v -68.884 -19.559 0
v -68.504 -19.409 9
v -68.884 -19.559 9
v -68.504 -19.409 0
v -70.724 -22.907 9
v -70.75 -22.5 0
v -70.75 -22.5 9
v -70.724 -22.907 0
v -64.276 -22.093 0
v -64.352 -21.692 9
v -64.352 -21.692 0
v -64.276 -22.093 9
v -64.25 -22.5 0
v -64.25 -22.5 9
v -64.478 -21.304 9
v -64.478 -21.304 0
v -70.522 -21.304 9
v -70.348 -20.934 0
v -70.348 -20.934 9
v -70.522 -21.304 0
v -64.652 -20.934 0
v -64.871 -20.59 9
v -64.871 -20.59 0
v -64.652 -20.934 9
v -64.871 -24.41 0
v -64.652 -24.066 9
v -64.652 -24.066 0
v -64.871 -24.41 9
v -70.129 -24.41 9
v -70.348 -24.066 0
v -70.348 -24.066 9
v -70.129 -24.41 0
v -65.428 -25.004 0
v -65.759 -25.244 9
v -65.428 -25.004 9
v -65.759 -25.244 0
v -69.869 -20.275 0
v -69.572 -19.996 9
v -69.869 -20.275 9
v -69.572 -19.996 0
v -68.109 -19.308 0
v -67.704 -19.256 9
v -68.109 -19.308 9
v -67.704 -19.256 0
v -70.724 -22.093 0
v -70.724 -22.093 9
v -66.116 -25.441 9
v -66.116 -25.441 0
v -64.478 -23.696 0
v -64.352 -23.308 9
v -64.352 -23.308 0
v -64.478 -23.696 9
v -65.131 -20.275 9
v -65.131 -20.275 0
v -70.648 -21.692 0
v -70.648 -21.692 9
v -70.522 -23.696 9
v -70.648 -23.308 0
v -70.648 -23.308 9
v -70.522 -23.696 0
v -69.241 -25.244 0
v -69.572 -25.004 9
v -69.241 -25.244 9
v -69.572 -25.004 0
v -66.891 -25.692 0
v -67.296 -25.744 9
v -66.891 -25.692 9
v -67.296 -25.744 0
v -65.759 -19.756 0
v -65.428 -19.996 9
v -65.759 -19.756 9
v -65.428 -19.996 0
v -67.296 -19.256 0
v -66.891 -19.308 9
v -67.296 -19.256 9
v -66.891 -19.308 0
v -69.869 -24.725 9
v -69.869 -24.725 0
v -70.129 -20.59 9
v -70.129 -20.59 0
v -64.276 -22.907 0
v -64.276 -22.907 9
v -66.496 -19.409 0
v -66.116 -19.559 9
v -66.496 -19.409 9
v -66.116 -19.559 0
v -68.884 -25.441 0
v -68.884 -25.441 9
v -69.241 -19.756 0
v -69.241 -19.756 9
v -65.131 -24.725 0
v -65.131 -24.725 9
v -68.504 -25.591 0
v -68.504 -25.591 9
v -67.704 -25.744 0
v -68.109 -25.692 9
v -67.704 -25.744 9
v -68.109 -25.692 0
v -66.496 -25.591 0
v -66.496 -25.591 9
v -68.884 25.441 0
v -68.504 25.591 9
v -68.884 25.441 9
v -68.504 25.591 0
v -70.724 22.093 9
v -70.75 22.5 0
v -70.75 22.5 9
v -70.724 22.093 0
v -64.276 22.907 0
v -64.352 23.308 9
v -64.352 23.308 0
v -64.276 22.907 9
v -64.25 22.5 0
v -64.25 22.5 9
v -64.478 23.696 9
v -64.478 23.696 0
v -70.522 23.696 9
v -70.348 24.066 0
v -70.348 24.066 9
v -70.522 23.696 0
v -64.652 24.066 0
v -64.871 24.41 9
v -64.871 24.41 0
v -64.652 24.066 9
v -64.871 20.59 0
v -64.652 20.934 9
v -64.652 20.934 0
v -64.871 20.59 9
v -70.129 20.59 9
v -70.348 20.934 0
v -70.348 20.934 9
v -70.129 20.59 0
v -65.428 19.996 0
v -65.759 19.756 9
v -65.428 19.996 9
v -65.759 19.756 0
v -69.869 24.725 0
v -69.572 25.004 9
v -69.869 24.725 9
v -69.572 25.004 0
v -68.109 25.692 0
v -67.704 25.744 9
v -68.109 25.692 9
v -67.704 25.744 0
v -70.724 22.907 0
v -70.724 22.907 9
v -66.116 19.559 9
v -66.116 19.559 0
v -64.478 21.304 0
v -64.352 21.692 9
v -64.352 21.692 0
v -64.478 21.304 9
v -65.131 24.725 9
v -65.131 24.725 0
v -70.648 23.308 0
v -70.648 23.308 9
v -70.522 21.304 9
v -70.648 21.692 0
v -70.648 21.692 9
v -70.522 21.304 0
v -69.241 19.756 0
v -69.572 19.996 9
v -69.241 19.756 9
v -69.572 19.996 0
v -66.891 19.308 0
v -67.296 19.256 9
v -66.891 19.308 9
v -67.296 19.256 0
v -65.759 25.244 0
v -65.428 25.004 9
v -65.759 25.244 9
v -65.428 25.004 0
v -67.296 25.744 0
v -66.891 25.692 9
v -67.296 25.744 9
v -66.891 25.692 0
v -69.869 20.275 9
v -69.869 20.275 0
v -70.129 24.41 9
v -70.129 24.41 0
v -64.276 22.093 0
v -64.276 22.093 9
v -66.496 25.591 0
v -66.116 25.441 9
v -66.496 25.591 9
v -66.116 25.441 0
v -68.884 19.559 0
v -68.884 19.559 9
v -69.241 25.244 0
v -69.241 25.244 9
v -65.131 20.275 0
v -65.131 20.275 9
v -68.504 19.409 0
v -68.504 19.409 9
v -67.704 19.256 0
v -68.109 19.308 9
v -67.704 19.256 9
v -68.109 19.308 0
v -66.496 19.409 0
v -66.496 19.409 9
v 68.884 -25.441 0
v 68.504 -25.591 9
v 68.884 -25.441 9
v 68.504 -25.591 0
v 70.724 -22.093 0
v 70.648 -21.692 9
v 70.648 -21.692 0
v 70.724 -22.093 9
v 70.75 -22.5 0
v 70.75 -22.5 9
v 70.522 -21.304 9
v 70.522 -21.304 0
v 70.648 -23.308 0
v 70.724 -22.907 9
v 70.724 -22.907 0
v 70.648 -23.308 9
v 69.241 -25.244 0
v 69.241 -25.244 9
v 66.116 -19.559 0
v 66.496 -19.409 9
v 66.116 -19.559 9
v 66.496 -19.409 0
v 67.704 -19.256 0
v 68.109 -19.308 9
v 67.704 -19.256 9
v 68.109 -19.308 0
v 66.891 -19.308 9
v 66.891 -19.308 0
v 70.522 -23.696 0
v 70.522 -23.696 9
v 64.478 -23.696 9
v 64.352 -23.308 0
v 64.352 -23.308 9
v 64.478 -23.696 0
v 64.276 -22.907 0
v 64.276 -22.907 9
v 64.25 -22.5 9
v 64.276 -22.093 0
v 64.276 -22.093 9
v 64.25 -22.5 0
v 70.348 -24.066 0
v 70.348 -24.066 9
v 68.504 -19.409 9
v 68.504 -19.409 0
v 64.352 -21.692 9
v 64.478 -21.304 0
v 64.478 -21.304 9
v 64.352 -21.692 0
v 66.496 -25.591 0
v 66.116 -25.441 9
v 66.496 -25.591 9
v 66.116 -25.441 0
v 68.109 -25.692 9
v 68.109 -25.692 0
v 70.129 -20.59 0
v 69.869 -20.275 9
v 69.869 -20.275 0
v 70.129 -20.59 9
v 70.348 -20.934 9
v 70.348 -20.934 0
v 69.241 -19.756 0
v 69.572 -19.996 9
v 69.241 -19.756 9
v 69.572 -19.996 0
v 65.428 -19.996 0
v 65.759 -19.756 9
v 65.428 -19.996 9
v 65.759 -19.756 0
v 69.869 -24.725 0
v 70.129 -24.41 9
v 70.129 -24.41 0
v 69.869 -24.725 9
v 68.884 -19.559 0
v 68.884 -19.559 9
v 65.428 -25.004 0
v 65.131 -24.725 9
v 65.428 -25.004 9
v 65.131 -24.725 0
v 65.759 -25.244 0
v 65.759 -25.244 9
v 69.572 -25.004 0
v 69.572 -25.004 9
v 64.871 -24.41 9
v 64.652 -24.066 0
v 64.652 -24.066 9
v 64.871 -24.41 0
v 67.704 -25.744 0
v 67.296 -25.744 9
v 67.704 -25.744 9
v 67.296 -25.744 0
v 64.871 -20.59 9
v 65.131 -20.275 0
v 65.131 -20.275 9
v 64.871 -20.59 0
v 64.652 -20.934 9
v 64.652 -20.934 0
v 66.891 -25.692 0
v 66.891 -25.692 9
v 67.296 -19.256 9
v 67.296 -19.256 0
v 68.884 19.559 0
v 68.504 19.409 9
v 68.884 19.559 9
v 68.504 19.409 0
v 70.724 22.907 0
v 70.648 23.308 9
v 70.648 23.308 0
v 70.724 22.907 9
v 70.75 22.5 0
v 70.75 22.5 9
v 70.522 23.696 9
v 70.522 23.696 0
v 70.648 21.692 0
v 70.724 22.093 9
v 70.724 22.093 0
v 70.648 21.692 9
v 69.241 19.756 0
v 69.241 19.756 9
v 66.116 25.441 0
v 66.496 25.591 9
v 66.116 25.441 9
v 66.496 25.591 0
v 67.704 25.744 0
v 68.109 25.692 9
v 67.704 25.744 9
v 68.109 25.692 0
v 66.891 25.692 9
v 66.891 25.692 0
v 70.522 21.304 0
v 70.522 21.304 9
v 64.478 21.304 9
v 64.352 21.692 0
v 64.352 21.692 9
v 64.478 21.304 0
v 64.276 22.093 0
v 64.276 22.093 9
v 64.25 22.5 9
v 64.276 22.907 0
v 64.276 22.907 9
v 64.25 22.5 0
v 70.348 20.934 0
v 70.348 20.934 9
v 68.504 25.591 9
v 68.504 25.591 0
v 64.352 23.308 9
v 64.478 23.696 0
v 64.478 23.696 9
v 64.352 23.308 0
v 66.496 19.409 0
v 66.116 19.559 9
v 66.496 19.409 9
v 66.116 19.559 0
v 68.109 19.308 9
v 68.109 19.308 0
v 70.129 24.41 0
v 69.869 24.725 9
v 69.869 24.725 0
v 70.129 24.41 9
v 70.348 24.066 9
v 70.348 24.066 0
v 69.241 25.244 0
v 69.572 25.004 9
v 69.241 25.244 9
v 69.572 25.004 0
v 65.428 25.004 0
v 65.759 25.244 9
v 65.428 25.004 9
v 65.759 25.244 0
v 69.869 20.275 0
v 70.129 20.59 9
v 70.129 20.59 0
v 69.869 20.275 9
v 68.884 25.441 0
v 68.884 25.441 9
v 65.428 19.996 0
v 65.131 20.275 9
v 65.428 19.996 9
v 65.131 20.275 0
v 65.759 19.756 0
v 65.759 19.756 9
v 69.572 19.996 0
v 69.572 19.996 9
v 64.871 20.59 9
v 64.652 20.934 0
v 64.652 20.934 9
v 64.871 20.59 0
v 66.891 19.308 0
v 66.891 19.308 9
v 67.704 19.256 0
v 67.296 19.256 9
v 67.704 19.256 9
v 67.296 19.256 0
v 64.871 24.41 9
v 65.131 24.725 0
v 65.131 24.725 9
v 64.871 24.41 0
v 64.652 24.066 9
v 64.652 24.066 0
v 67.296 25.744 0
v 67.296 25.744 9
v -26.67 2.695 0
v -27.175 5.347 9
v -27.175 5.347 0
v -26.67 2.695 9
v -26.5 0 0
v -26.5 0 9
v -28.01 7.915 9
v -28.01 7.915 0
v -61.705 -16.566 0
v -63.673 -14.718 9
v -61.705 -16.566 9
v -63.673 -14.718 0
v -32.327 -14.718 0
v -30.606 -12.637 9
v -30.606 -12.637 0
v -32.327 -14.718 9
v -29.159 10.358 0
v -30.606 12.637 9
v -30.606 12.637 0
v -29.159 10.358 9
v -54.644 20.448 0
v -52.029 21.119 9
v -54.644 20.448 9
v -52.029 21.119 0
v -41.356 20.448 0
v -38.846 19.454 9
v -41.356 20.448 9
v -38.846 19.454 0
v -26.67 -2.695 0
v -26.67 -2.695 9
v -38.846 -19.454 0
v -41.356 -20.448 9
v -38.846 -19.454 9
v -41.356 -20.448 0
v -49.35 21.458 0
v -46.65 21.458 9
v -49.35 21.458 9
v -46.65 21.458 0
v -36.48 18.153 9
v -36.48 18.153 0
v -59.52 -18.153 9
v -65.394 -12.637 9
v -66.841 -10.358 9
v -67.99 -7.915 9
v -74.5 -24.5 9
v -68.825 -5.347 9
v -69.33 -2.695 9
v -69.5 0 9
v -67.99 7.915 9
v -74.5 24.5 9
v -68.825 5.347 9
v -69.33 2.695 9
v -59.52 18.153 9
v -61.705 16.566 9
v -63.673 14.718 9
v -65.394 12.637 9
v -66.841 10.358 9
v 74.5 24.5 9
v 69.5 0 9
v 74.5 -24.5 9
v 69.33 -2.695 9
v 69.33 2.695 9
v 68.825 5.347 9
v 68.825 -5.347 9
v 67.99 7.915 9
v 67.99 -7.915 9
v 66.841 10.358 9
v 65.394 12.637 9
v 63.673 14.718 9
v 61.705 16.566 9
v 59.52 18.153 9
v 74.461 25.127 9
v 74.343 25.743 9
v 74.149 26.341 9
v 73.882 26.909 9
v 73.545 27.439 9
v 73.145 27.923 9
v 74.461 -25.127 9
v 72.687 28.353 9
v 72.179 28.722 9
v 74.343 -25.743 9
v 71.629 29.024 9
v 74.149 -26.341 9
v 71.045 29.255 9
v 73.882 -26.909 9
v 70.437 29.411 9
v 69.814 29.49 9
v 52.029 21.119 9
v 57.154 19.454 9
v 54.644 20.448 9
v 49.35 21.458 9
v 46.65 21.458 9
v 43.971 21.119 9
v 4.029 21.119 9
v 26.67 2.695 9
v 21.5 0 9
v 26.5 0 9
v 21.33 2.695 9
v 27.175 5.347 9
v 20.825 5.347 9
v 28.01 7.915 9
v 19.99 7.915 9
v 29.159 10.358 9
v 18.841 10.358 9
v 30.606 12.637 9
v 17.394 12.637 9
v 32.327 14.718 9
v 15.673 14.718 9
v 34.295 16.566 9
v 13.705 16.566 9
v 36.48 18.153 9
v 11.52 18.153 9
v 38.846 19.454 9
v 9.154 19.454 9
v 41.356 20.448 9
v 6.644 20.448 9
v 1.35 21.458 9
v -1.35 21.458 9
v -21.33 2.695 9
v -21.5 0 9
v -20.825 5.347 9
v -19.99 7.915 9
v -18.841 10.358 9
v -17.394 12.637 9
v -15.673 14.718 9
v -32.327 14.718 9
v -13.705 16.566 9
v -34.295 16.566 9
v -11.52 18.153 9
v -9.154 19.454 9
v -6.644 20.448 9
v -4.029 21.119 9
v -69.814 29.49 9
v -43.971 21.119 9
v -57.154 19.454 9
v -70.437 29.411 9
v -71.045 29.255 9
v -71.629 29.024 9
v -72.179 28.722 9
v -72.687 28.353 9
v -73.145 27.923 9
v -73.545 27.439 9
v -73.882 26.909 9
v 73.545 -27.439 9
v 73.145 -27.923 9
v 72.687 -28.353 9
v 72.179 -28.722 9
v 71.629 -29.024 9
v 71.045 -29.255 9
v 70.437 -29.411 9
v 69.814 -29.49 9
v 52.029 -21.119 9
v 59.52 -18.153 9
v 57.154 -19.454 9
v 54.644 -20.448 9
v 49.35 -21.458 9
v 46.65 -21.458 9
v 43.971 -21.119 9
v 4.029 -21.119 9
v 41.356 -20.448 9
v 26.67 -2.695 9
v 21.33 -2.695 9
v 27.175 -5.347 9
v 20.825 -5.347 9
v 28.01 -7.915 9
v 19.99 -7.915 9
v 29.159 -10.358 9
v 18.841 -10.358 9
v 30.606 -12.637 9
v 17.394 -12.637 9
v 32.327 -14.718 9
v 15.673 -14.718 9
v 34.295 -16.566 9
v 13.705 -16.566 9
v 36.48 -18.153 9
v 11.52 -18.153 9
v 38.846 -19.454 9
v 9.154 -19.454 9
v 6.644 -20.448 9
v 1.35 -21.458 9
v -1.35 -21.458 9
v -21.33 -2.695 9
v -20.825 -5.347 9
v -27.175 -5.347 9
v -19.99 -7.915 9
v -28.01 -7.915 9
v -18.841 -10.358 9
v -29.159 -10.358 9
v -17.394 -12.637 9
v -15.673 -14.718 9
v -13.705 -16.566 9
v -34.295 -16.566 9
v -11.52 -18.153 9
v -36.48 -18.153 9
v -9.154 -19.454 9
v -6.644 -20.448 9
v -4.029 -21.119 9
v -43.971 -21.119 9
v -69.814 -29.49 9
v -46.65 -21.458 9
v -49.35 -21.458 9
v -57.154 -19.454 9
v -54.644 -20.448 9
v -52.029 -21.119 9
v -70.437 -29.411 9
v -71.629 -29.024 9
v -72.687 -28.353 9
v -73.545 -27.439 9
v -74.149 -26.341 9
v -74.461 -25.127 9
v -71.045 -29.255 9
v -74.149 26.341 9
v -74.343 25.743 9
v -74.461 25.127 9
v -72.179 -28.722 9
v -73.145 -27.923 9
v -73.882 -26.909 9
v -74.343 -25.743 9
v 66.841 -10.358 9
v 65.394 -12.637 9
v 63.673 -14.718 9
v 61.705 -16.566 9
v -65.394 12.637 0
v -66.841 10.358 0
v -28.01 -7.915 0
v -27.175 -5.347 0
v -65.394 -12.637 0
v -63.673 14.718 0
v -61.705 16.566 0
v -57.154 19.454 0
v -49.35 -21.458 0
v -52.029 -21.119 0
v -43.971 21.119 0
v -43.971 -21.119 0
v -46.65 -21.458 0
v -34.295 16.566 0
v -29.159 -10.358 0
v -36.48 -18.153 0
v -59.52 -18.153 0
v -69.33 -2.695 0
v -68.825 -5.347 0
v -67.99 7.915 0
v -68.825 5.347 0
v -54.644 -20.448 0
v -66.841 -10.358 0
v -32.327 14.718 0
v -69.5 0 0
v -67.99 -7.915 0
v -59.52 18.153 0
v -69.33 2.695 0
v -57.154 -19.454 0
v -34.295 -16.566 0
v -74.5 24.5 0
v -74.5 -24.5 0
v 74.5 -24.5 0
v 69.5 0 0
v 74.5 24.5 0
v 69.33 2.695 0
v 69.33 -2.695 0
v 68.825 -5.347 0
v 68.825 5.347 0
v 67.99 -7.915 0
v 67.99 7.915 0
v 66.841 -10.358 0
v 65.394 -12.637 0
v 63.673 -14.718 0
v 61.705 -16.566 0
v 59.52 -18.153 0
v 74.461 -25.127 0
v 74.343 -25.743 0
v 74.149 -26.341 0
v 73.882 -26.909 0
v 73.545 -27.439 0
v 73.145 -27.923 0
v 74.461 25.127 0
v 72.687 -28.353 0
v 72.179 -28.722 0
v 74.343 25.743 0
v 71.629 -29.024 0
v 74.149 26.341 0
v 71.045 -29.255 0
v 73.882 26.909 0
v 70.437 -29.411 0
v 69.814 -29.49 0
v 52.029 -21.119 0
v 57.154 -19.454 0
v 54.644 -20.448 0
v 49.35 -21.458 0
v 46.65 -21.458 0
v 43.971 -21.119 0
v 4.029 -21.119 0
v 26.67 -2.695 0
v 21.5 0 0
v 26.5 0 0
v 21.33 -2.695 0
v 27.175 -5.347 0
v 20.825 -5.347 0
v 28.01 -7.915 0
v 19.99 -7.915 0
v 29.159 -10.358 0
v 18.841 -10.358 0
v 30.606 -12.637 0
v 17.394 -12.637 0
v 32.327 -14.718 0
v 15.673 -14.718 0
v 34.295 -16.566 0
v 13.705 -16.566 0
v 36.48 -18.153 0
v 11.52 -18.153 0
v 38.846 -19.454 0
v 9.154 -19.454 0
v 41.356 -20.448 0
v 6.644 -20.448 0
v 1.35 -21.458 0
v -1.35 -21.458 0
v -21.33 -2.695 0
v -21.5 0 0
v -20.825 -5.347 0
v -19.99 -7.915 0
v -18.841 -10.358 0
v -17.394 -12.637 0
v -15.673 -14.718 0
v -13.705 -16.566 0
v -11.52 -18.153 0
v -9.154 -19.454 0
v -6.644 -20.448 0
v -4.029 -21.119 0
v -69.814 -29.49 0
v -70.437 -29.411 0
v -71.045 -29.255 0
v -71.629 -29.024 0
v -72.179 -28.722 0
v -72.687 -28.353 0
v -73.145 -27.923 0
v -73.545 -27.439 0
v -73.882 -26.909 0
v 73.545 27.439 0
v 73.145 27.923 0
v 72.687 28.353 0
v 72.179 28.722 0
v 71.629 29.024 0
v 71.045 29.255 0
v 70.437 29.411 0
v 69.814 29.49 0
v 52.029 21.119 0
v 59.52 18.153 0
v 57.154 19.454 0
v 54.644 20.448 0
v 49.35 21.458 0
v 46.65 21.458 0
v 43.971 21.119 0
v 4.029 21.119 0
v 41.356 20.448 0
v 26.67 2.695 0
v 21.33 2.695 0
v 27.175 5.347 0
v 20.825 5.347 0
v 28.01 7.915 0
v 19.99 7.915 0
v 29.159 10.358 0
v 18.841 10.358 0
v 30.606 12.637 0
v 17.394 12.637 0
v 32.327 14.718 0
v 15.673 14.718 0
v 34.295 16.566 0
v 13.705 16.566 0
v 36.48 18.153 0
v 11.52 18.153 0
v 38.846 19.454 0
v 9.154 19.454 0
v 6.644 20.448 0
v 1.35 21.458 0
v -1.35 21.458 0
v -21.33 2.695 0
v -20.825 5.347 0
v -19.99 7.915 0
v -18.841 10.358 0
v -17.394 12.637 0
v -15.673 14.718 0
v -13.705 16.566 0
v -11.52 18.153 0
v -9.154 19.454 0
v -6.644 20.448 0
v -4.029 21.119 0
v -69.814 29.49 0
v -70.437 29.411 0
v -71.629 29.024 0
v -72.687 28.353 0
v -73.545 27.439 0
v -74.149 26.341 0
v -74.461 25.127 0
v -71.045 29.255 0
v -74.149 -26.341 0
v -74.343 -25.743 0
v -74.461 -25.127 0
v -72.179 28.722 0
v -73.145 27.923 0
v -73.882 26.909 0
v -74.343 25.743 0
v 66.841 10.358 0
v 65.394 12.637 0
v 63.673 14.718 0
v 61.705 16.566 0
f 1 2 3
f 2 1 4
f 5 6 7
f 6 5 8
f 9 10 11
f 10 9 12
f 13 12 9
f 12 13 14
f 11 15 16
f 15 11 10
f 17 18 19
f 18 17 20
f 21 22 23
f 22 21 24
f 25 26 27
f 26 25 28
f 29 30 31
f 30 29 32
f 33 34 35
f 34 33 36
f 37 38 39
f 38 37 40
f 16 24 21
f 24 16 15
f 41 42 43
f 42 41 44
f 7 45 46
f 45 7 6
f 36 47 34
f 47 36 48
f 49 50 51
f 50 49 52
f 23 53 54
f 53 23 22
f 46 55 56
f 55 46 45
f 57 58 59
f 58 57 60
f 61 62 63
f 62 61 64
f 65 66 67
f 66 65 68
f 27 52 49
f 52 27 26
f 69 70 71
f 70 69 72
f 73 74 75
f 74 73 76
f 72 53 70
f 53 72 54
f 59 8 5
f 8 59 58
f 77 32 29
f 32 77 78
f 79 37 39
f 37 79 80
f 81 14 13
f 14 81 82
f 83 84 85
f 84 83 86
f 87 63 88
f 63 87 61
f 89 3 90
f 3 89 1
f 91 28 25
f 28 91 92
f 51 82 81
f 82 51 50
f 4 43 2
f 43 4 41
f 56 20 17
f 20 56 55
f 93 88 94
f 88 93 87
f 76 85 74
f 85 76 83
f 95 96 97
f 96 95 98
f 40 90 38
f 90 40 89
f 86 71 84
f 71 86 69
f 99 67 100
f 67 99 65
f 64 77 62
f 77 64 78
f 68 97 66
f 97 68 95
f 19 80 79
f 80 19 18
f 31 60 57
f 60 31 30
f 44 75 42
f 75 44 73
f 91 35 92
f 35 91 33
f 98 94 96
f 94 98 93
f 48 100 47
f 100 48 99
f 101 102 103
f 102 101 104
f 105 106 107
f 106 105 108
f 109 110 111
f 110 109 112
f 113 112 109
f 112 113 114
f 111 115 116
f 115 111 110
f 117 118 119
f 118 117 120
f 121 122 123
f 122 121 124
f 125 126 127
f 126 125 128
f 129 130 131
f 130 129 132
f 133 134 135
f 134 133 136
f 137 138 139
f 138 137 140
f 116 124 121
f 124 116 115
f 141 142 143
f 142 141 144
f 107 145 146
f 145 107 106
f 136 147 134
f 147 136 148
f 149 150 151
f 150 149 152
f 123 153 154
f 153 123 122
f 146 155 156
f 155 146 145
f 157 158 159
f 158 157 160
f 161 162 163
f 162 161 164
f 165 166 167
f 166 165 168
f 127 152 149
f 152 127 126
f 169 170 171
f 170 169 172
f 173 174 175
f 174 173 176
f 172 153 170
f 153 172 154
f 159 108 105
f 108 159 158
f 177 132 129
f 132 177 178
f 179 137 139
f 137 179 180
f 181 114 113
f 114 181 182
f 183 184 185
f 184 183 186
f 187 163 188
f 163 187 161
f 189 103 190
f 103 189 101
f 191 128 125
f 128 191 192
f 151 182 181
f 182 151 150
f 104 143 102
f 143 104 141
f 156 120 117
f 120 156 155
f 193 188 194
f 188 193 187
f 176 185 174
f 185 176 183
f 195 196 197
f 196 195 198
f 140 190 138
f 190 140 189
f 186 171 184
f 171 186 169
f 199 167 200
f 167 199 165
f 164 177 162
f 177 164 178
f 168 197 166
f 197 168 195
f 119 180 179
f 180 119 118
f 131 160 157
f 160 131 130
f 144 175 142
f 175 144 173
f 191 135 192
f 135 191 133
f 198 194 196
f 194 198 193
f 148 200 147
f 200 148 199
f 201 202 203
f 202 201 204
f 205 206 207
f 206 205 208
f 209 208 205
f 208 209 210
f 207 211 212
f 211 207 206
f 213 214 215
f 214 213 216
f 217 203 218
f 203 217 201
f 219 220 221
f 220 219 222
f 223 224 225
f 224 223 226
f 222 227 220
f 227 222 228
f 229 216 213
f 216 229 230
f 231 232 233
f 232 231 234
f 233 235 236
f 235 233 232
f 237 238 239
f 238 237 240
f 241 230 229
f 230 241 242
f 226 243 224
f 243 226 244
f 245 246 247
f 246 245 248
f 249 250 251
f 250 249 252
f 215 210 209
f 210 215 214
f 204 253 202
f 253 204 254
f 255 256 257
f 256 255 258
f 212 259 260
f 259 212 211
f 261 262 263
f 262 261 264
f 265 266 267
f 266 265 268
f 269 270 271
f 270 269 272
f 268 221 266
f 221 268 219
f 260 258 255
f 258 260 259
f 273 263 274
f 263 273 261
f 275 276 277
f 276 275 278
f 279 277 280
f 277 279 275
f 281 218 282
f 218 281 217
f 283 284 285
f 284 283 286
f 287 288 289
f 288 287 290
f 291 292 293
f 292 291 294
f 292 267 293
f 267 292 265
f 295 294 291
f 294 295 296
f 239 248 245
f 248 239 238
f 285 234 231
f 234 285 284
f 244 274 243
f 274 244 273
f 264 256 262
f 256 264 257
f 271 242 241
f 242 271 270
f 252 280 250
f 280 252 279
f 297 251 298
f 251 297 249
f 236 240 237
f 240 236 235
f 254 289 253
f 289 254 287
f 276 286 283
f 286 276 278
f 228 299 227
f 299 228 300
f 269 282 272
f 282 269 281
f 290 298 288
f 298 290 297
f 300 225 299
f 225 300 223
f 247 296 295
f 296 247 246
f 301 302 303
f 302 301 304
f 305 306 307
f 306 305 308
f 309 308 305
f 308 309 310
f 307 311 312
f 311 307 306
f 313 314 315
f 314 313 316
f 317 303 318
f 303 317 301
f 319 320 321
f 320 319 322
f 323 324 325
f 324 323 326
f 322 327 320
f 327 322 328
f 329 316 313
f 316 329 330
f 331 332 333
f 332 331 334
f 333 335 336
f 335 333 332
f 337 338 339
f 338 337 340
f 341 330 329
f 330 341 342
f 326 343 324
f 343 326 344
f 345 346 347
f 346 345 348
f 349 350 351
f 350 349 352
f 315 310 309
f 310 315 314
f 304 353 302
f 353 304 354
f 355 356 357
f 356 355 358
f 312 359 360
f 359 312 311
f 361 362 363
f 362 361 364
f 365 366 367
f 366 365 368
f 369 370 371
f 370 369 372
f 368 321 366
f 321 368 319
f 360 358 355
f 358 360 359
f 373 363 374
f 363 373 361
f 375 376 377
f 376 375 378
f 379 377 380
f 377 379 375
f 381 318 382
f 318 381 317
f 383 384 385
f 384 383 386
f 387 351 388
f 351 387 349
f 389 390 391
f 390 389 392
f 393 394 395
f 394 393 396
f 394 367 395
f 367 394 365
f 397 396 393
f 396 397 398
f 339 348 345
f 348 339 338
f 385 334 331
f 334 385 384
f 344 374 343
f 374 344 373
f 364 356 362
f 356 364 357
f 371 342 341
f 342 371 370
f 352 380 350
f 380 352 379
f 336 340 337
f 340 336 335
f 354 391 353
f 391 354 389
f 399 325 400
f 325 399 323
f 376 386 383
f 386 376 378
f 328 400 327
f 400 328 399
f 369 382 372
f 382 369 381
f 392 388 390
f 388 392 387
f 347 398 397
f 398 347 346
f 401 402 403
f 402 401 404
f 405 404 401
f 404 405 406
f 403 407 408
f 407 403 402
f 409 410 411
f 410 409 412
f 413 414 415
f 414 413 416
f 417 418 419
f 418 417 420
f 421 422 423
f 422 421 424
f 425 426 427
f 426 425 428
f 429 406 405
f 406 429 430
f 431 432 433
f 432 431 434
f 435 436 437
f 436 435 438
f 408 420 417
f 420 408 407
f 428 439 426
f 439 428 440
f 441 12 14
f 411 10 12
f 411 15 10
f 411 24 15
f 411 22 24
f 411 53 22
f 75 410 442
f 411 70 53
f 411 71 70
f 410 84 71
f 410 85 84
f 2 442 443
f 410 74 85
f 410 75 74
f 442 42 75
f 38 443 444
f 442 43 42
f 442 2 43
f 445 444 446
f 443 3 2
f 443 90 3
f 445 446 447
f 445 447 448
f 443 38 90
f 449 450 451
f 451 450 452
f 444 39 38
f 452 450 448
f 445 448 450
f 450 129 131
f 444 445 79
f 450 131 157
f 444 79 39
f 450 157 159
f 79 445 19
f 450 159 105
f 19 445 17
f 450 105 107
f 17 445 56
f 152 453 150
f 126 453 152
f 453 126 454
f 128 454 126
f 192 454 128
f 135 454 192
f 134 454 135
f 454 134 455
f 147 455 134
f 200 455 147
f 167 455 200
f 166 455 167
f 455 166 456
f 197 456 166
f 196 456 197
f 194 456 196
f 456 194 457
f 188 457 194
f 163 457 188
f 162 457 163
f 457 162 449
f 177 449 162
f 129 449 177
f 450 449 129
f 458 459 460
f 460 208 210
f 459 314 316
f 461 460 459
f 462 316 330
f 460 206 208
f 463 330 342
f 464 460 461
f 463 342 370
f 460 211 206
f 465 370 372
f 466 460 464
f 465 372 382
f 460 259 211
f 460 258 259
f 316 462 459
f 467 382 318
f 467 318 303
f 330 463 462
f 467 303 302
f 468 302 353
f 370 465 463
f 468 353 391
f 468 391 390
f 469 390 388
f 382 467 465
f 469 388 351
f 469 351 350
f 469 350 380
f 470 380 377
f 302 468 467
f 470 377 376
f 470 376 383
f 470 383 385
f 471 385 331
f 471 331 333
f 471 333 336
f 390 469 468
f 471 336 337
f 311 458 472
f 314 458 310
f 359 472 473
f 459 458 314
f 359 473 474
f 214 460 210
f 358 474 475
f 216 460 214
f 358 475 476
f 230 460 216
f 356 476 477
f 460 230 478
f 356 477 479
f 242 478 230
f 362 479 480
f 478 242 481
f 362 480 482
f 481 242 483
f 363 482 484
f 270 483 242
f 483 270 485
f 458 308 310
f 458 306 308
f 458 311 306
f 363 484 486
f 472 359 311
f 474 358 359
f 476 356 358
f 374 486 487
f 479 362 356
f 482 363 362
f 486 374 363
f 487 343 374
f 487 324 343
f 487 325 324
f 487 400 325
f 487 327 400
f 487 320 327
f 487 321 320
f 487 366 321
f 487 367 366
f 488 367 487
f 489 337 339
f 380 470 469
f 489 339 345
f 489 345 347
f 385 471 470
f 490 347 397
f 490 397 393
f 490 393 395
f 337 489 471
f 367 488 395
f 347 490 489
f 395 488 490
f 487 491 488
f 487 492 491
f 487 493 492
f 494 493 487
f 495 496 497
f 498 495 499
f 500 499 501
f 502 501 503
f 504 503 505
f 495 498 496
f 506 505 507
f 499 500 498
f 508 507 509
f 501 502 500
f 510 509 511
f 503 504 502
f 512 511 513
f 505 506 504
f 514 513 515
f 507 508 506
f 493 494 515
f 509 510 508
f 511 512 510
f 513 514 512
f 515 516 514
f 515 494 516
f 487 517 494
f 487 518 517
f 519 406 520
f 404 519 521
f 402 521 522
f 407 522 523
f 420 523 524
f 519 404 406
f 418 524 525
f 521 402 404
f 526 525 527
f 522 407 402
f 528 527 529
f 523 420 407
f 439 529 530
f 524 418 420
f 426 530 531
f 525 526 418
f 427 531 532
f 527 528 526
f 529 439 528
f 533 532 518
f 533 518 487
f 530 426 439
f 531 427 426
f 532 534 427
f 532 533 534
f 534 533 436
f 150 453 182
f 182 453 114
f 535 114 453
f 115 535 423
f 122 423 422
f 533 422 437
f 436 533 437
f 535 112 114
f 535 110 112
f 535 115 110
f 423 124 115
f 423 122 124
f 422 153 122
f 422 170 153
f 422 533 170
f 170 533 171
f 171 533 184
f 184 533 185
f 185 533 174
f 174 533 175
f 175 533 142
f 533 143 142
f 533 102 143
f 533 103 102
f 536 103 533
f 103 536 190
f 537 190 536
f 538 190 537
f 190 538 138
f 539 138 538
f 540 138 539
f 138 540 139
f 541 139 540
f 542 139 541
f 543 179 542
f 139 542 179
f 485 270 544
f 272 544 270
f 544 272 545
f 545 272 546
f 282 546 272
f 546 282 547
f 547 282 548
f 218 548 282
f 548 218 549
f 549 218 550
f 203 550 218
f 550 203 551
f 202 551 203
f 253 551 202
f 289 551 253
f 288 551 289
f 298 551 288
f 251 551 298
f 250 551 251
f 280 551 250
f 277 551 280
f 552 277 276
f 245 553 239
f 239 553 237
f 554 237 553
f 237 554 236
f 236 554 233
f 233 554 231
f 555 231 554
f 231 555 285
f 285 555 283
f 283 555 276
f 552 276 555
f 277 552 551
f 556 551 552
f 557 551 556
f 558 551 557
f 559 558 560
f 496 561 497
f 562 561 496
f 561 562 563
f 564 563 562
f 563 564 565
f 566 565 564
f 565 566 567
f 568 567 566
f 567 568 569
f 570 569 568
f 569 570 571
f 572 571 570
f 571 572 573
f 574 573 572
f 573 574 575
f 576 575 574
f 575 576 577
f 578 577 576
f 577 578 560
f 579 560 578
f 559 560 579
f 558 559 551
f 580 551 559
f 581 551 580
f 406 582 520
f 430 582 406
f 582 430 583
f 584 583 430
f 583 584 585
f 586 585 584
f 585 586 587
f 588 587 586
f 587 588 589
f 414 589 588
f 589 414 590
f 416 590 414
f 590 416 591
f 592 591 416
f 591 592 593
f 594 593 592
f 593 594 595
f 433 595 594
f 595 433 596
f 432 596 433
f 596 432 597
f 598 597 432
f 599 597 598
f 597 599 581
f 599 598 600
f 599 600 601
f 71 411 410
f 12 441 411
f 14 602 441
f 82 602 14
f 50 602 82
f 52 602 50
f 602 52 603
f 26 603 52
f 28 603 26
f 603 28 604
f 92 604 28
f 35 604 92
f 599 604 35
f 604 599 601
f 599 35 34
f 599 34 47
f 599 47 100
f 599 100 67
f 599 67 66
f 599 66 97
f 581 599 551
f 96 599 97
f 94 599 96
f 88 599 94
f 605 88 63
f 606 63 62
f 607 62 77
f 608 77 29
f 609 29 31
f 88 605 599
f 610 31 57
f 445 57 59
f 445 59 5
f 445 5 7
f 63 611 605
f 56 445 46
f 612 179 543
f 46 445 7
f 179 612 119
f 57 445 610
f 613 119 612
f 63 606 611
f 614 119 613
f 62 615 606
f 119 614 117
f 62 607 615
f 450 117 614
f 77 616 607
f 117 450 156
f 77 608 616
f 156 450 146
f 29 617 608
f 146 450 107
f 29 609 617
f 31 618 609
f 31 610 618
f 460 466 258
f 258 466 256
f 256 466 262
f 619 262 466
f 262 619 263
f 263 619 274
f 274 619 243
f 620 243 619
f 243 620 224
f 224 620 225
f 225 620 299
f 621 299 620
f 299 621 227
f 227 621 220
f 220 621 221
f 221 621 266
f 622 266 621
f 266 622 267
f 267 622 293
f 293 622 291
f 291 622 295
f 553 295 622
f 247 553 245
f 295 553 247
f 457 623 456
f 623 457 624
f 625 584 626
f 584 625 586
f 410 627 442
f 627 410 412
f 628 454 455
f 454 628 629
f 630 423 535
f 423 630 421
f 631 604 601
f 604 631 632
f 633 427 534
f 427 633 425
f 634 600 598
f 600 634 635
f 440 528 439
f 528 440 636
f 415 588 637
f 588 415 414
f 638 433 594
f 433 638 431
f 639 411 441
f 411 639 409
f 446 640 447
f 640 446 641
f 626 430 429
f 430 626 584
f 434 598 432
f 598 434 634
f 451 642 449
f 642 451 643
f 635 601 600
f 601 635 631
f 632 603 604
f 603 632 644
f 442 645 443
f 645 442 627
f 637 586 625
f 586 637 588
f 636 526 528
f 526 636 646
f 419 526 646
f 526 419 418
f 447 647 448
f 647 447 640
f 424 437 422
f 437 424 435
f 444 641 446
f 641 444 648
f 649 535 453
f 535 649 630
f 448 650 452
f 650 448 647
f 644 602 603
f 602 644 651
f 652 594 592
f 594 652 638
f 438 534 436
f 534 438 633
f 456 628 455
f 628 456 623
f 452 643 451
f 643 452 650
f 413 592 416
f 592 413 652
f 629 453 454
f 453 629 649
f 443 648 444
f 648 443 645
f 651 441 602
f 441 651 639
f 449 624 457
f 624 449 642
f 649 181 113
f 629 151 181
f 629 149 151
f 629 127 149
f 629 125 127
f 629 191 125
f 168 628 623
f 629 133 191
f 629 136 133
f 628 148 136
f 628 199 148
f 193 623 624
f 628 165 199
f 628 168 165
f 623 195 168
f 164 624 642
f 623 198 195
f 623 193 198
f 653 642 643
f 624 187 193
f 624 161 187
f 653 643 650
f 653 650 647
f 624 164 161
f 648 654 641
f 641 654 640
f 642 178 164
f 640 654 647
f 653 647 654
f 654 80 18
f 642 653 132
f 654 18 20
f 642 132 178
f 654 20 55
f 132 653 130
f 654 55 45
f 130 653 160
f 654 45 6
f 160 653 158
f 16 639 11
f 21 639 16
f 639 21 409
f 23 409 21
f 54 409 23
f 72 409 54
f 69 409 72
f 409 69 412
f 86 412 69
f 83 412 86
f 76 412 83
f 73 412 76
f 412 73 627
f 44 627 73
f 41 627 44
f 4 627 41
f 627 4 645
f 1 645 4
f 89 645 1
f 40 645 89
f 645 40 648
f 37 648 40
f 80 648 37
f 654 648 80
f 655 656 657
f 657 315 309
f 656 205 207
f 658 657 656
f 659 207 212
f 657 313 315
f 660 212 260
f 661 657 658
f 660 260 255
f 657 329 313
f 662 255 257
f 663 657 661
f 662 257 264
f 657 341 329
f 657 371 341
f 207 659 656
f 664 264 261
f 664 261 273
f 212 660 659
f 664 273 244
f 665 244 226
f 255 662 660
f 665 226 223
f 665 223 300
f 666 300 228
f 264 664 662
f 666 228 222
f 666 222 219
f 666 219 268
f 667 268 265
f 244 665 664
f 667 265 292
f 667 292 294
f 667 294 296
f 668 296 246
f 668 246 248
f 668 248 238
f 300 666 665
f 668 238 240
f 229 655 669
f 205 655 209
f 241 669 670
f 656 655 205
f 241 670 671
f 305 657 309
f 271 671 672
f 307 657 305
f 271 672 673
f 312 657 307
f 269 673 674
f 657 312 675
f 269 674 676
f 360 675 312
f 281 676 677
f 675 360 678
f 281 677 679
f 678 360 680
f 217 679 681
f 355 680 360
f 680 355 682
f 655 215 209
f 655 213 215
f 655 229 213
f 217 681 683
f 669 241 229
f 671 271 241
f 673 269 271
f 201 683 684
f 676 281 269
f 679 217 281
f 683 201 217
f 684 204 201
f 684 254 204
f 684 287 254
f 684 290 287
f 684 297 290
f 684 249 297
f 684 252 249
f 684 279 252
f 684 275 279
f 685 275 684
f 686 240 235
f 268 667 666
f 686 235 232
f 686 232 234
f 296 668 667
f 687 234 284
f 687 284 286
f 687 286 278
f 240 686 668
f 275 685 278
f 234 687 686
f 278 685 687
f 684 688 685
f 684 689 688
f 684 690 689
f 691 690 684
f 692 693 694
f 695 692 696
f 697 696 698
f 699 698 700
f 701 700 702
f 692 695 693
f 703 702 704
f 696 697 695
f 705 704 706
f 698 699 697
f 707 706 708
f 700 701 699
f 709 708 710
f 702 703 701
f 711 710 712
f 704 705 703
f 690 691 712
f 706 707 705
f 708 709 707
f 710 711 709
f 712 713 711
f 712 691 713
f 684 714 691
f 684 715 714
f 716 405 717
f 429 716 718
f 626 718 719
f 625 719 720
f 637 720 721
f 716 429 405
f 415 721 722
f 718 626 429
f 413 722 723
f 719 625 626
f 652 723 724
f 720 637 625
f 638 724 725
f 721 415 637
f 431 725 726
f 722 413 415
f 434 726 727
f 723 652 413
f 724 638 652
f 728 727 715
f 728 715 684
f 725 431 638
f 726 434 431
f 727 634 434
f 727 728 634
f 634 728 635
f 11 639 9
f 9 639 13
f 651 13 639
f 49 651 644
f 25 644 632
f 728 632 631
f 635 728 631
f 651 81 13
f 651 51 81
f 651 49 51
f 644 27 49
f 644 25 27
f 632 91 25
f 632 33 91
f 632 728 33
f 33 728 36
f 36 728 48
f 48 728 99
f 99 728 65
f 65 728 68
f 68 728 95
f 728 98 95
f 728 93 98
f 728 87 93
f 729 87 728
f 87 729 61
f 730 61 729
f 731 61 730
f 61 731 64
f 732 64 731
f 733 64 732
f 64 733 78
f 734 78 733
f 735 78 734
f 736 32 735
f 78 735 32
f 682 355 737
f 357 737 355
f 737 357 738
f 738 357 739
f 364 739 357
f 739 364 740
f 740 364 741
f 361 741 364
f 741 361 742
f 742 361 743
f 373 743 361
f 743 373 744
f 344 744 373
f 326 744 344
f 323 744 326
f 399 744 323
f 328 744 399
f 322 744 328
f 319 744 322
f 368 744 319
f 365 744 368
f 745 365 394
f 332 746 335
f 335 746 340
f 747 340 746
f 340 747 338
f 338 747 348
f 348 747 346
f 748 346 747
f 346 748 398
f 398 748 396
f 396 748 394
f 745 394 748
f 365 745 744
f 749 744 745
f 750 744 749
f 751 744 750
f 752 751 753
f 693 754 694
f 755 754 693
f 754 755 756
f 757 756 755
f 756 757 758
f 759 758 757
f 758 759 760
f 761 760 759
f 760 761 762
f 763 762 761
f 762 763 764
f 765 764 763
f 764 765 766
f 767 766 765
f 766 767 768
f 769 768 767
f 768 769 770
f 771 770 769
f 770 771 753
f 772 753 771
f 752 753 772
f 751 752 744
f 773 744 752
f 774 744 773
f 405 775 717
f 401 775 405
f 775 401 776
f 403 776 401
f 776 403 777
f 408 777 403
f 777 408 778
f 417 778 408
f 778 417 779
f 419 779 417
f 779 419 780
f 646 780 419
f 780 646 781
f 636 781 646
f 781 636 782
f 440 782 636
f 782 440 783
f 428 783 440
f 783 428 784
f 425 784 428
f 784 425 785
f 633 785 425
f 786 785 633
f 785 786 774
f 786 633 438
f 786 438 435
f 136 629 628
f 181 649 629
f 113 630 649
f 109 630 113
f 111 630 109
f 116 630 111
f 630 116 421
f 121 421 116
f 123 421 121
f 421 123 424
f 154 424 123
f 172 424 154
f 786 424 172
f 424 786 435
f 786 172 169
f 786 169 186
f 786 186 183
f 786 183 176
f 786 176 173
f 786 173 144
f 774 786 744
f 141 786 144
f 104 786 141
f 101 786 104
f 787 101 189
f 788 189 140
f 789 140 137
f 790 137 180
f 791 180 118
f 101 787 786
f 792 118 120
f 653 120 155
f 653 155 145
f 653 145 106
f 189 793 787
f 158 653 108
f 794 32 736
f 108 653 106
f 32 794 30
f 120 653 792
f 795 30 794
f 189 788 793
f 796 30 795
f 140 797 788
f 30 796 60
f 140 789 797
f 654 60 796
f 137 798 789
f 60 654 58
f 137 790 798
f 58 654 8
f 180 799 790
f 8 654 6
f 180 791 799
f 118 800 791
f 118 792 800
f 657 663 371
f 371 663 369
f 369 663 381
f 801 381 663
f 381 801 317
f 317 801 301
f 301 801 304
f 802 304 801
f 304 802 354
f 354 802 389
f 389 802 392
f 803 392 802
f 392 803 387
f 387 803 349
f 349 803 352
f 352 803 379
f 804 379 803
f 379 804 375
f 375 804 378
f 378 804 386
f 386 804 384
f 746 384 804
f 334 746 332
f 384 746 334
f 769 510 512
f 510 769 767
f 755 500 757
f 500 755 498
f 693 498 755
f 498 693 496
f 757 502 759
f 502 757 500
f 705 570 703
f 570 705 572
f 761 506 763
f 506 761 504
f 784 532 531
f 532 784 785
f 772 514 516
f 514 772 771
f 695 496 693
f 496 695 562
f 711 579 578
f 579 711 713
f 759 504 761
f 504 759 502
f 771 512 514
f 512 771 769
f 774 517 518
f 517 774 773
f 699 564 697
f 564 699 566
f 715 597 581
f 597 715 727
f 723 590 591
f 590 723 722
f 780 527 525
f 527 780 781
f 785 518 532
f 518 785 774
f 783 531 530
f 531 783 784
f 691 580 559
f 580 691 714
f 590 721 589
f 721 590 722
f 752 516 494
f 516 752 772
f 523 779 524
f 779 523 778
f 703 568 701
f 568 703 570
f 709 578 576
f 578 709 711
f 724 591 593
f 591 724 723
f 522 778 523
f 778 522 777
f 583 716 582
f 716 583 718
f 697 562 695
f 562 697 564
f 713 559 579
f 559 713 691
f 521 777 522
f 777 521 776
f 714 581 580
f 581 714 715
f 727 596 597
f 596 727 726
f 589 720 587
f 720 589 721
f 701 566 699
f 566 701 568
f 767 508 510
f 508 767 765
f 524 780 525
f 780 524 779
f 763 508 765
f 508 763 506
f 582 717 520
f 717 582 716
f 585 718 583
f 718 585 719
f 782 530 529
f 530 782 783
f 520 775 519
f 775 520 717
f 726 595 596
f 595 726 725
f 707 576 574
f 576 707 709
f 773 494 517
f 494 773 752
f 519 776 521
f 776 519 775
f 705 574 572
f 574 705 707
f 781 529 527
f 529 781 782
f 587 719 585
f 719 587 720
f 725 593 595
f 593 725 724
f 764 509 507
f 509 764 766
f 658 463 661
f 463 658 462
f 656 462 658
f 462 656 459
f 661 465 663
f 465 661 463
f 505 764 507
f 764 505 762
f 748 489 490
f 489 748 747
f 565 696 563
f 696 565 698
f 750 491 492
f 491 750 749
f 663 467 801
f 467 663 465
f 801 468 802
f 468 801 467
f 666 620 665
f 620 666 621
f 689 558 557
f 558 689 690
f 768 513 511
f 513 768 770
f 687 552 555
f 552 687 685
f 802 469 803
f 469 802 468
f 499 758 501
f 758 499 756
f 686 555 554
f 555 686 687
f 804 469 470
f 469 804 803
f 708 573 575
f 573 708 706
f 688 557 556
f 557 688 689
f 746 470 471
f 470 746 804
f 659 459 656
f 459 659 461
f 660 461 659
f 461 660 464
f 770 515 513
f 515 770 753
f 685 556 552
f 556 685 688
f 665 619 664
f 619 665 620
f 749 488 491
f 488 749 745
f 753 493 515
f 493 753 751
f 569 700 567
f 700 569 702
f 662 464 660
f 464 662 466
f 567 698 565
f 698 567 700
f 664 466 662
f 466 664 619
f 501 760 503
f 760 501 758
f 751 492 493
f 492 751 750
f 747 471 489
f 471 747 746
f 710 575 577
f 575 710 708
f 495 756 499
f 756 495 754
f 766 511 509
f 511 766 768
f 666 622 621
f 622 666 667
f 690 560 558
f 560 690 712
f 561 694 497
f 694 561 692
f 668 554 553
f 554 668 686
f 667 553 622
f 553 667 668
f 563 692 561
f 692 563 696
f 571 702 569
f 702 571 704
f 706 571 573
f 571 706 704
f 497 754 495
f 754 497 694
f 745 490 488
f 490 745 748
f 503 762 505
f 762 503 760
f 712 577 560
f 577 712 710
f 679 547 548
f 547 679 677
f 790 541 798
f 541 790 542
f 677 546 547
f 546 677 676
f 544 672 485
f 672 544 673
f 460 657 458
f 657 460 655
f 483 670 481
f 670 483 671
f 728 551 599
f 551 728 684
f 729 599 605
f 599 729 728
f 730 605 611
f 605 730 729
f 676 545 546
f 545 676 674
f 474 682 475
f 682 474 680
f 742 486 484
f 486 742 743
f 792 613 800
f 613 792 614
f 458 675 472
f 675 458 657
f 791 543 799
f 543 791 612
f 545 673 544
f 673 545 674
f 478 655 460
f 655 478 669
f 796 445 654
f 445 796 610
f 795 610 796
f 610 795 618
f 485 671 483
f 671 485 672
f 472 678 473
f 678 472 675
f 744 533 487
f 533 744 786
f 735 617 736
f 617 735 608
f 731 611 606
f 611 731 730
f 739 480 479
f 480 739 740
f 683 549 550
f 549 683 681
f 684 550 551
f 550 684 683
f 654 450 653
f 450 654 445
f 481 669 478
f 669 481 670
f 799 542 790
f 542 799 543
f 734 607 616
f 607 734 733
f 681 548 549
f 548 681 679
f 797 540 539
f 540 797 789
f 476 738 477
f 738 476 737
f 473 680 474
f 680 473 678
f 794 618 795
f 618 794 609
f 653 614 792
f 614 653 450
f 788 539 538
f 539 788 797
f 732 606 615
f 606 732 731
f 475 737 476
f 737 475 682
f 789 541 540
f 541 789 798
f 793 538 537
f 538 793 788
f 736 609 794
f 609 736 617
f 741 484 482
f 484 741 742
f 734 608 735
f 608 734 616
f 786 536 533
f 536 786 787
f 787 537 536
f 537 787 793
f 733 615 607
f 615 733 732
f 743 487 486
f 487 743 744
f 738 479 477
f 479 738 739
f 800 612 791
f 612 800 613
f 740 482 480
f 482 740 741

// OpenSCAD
$fn = 50;


difference() {
	union() {
		hull() {
			translate(v = [-69.5000000000, 24.5000000000, 0]) {
				cylinder(h = 9, r = 5);
			}
			translate(v = [69.5000000000, 24.5000000000, 0]) {
				cylinder(h = 9, r = 5);
			}
			translate(v = [-69.5000000000, -24.5000000000, 0]) {
				cylinder(h = 9, r = 5);
			}
			translate(v = [69.5000000000, -24.5000000000, 0]) {
				cylinder(h = 9, r = 5);
			}
		}
	}
	union() {
		#translate(v = [-67.5000000000, -22.5000000000, -100.0000000000]) {
			cylinder(h = 200, r = 3.2500000000);
		}
		#translate(v = [-67.5000000000, 22.5000000000, -100.0000000000]) {
			cylinder(h = 200, r = 3.2500000000);
		}
		#translate(v = [67.5000000000, -22.5000000000, -100.0000000000]) {
			cylinder(h = 200, r = 3.2500000000);
		}
		#translate(v = [67.5000000000, 22.5000000000, -100.0000000000]) {
			cylinder(h = 200, r = 3.2500000000);
		}
		#translate(v = [-48.0000000000, 0, 0]) {
			cylinder(h = 9, r = 21.5000000000);
		}
		#cylinder(h = 9, r = 21.5000000000);
		#translate(v = [48.0000000000, 0, 0]) {
			cylinder(h = 9, r = 21.5000000000);
		}
	}
}
